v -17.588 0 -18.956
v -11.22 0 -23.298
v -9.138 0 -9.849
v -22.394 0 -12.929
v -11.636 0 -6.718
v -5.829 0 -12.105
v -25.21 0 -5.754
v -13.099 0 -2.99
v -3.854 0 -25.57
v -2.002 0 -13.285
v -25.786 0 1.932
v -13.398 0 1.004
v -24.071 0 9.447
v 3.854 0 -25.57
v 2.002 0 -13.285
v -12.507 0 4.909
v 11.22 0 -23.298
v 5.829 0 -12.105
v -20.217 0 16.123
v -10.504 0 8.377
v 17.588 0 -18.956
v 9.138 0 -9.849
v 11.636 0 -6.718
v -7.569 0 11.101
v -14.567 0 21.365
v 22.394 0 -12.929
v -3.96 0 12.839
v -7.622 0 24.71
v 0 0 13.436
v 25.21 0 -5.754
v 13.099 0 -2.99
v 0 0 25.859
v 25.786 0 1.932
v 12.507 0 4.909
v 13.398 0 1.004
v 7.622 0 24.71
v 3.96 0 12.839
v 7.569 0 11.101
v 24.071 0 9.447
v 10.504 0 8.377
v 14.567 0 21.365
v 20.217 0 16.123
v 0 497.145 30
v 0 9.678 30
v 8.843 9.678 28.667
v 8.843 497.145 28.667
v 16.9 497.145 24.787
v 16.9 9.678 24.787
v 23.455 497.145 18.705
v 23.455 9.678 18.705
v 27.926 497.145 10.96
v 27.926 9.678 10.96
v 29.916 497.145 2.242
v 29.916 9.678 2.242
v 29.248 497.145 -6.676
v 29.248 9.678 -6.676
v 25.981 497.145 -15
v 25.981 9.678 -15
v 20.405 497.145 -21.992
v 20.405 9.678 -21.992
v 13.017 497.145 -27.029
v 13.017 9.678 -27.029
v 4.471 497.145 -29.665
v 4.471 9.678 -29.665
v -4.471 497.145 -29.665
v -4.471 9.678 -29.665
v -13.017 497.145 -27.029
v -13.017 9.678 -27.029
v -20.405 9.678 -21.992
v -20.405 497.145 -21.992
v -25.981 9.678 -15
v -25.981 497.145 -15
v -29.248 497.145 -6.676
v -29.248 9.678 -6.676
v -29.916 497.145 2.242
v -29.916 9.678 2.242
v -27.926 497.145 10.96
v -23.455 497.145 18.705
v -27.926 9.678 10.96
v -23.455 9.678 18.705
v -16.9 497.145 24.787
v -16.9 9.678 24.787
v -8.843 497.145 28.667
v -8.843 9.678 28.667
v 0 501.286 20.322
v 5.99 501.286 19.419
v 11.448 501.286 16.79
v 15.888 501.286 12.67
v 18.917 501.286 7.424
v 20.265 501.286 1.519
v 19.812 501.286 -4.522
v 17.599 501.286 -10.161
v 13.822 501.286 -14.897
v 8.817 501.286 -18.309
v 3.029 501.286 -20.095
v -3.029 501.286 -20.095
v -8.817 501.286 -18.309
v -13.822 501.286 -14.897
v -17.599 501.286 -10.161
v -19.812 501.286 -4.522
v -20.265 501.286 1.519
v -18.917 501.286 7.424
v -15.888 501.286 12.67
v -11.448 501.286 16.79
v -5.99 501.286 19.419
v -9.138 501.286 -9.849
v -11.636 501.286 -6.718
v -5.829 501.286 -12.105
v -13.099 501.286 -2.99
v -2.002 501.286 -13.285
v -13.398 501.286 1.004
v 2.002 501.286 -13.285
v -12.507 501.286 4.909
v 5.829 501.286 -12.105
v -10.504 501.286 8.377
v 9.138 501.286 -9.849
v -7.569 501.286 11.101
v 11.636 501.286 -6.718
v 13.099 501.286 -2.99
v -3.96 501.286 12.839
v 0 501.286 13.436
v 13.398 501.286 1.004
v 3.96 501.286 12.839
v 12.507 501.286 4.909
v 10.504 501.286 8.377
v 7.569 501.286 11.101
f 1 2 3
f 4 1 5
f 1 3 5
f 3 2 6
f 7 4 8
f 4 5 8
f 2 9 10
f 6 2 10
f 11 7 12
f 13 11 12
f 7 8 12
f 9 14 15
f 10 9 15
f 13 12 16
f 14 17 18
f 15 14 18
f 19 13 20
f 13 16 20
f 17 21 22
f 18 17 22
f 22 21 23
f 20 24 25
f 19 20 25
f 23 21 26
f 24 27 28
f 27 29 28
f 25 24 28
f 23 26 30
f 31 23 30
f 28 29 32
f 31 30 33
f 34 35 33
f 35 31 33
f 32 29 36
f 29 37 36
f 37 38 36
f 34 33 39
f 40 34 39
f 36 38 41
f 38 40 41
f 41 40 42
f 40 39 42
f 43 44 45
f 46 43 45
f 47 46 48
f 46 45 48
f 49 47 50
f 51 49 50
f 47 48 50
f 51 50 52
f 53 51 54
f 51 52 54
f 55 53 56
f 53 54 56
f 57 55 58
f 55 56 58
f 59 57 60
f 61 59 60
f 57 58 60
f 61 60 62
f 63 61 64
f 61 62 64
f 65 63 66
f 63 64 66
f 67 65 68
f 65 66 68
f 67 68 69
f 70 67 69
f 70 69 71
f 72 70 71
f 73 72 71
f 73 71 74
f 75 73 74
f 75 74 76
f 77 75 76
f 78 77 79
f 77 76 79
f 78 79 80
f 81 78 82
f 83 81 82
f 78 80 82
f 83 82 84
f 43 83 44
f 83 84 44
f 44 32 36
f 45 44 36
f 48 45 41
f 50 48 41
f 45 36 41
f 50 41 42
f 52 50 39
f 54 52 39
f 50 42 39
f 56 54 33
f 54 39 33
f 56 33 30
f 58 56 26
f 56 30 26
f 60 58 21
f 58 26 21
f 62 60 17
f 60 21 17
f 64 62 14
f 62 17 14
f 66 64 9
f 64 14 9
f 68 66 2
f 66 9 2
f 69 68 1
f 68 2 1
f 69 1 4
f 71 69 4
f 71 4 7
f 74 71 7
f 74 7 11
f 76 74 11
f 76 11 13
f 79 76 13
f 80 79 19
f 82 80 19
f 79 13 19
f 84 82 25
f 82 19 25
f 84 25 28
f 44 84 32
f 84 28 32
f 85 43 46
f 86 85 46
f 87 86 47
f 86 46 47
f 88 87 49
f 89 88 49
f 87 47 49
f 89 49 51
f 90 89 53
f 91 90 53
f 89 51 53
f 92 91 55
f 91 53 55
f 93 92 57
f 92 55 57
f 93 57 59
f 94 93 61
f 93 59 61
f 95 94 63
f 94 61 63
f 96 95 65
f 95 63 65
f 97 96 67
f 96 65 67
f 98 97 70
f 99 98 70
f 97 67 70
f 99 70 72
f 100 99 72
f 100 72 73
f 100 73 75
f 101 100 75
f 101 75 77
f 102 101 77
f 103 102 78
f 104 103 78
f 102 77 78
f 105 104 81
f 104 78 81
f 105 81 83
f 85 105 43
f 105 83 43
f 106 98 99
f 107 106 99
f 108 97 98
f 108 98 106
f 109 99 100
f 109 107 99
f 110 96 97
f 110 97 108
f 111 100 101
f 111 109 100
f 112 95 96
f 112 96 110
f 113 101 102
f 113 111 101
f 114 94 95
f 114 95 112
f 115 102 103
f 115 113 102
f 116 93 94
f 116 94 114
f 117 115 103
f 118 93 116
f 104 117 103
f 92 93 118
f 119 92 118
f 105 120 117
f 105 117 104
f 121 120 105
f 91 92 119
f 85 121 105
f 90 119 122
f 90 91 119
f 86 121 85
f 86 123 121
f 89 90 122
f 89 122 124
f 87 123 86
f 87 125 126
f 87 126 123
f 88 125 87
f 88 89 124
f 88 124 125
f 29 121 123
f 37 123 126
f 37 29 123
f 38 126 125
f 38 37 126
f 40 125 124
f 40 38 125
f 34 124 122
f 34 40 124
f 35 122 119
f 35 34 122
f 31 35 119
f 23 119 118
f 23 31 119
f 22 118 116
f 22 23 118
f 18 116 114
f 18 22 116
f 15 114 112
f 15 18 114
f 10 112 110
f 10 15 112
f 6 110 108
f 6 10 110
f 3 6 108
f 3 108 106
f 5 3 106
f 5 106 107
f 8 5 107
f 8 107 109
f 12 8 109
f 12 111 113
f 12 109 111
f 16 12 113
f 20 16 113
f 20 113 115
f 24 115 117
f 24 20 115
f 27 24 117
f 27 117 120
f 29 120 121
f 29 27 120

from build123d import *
from OCP.BRepFilletAPI import BRepFilletAPI_MakeChamfer

# Parameters (mm, degrees)
SKETCH1_R           = 30
BOSS_EXTRUDE1_DEPTH = 501.28639667
SKETCH2_R           = 13.435553616
CUT_EXTRUDE1_DEPTH  = 504.078573869
CHAMFER1_SIZE       = 4.14144178
CHAMFER1_SIZE2      = 9.678483386


with BuildPart() as part:
    # Sketch1 → Boss-Extrude1 (new body)
    with BuildSketch(Plane(origin=(0, 0, 0), x_dir=(1, 0, 0), z_dir=(0, 1, 0))):
        Circle(SKETCH1_R)
    extrude(amount=BOSS_EXTRUDE1_DEPTH)

    # Sketch2 → Cut-Extrude1 (cut, through all)
    with BuildSketch(Plane(origin=(0, 0, 0), x_dir=(1, 0, 0), z_dir=(0, 1, 0))):
        Circle(SKETCH2_R)
    extrude(amount=CUT_EXTRUDE1_DEPTH, mode=Mode.SUBTRACT)

    # Chamfer1: one chamfer whose edges measure the first distance from different faces: ONE call of the kernel's chamfer builder (chamfer() names one face for all edges)
    chamfer1_edges_1 = [part.edges().sort_by_distance(p)[0] for p in [
        (-30, 501.28639667, 0),
    ]]
    chamfer1_side_1 = [part.faces().sort_by_distance(p)[0] for p in [
        (-30, 250.643198335, 0),
    ]]
    chamfer1_edges_2 = [part.edges().sort_by_distance(p)[0] for p in [
        (-30, 0, 0),
    ]]
    chamfer1_side_2 = [part.faces().sort_by_distance(p)[0] for p in [
        (-29.151471863, 0, 0),
    ]]
    chamfer1 = BRepFilletAPI_MakeChamfer(part.part.solid().wrapped)
    for e in chamfer1_edges_1:
        chamfer1.Add(CHAMFER1_SIZE, CHAMFER1_SIZE2, e.wrapped, chamfer1_side_1[0].wrapped)  # the first distance lies on this face
    for e in chamfer1_edges_2:
        chamfer1.Add(CHAMFER1_SIZE, CHAMFER1_SIZE2, e.wrapped, chamfer1_side_2[0].wrapped)  # the first distance lies on this face
    add(Compound.cast(chamfer1.Shape()), mode=Mode.REPLACE)


solid = part.part
